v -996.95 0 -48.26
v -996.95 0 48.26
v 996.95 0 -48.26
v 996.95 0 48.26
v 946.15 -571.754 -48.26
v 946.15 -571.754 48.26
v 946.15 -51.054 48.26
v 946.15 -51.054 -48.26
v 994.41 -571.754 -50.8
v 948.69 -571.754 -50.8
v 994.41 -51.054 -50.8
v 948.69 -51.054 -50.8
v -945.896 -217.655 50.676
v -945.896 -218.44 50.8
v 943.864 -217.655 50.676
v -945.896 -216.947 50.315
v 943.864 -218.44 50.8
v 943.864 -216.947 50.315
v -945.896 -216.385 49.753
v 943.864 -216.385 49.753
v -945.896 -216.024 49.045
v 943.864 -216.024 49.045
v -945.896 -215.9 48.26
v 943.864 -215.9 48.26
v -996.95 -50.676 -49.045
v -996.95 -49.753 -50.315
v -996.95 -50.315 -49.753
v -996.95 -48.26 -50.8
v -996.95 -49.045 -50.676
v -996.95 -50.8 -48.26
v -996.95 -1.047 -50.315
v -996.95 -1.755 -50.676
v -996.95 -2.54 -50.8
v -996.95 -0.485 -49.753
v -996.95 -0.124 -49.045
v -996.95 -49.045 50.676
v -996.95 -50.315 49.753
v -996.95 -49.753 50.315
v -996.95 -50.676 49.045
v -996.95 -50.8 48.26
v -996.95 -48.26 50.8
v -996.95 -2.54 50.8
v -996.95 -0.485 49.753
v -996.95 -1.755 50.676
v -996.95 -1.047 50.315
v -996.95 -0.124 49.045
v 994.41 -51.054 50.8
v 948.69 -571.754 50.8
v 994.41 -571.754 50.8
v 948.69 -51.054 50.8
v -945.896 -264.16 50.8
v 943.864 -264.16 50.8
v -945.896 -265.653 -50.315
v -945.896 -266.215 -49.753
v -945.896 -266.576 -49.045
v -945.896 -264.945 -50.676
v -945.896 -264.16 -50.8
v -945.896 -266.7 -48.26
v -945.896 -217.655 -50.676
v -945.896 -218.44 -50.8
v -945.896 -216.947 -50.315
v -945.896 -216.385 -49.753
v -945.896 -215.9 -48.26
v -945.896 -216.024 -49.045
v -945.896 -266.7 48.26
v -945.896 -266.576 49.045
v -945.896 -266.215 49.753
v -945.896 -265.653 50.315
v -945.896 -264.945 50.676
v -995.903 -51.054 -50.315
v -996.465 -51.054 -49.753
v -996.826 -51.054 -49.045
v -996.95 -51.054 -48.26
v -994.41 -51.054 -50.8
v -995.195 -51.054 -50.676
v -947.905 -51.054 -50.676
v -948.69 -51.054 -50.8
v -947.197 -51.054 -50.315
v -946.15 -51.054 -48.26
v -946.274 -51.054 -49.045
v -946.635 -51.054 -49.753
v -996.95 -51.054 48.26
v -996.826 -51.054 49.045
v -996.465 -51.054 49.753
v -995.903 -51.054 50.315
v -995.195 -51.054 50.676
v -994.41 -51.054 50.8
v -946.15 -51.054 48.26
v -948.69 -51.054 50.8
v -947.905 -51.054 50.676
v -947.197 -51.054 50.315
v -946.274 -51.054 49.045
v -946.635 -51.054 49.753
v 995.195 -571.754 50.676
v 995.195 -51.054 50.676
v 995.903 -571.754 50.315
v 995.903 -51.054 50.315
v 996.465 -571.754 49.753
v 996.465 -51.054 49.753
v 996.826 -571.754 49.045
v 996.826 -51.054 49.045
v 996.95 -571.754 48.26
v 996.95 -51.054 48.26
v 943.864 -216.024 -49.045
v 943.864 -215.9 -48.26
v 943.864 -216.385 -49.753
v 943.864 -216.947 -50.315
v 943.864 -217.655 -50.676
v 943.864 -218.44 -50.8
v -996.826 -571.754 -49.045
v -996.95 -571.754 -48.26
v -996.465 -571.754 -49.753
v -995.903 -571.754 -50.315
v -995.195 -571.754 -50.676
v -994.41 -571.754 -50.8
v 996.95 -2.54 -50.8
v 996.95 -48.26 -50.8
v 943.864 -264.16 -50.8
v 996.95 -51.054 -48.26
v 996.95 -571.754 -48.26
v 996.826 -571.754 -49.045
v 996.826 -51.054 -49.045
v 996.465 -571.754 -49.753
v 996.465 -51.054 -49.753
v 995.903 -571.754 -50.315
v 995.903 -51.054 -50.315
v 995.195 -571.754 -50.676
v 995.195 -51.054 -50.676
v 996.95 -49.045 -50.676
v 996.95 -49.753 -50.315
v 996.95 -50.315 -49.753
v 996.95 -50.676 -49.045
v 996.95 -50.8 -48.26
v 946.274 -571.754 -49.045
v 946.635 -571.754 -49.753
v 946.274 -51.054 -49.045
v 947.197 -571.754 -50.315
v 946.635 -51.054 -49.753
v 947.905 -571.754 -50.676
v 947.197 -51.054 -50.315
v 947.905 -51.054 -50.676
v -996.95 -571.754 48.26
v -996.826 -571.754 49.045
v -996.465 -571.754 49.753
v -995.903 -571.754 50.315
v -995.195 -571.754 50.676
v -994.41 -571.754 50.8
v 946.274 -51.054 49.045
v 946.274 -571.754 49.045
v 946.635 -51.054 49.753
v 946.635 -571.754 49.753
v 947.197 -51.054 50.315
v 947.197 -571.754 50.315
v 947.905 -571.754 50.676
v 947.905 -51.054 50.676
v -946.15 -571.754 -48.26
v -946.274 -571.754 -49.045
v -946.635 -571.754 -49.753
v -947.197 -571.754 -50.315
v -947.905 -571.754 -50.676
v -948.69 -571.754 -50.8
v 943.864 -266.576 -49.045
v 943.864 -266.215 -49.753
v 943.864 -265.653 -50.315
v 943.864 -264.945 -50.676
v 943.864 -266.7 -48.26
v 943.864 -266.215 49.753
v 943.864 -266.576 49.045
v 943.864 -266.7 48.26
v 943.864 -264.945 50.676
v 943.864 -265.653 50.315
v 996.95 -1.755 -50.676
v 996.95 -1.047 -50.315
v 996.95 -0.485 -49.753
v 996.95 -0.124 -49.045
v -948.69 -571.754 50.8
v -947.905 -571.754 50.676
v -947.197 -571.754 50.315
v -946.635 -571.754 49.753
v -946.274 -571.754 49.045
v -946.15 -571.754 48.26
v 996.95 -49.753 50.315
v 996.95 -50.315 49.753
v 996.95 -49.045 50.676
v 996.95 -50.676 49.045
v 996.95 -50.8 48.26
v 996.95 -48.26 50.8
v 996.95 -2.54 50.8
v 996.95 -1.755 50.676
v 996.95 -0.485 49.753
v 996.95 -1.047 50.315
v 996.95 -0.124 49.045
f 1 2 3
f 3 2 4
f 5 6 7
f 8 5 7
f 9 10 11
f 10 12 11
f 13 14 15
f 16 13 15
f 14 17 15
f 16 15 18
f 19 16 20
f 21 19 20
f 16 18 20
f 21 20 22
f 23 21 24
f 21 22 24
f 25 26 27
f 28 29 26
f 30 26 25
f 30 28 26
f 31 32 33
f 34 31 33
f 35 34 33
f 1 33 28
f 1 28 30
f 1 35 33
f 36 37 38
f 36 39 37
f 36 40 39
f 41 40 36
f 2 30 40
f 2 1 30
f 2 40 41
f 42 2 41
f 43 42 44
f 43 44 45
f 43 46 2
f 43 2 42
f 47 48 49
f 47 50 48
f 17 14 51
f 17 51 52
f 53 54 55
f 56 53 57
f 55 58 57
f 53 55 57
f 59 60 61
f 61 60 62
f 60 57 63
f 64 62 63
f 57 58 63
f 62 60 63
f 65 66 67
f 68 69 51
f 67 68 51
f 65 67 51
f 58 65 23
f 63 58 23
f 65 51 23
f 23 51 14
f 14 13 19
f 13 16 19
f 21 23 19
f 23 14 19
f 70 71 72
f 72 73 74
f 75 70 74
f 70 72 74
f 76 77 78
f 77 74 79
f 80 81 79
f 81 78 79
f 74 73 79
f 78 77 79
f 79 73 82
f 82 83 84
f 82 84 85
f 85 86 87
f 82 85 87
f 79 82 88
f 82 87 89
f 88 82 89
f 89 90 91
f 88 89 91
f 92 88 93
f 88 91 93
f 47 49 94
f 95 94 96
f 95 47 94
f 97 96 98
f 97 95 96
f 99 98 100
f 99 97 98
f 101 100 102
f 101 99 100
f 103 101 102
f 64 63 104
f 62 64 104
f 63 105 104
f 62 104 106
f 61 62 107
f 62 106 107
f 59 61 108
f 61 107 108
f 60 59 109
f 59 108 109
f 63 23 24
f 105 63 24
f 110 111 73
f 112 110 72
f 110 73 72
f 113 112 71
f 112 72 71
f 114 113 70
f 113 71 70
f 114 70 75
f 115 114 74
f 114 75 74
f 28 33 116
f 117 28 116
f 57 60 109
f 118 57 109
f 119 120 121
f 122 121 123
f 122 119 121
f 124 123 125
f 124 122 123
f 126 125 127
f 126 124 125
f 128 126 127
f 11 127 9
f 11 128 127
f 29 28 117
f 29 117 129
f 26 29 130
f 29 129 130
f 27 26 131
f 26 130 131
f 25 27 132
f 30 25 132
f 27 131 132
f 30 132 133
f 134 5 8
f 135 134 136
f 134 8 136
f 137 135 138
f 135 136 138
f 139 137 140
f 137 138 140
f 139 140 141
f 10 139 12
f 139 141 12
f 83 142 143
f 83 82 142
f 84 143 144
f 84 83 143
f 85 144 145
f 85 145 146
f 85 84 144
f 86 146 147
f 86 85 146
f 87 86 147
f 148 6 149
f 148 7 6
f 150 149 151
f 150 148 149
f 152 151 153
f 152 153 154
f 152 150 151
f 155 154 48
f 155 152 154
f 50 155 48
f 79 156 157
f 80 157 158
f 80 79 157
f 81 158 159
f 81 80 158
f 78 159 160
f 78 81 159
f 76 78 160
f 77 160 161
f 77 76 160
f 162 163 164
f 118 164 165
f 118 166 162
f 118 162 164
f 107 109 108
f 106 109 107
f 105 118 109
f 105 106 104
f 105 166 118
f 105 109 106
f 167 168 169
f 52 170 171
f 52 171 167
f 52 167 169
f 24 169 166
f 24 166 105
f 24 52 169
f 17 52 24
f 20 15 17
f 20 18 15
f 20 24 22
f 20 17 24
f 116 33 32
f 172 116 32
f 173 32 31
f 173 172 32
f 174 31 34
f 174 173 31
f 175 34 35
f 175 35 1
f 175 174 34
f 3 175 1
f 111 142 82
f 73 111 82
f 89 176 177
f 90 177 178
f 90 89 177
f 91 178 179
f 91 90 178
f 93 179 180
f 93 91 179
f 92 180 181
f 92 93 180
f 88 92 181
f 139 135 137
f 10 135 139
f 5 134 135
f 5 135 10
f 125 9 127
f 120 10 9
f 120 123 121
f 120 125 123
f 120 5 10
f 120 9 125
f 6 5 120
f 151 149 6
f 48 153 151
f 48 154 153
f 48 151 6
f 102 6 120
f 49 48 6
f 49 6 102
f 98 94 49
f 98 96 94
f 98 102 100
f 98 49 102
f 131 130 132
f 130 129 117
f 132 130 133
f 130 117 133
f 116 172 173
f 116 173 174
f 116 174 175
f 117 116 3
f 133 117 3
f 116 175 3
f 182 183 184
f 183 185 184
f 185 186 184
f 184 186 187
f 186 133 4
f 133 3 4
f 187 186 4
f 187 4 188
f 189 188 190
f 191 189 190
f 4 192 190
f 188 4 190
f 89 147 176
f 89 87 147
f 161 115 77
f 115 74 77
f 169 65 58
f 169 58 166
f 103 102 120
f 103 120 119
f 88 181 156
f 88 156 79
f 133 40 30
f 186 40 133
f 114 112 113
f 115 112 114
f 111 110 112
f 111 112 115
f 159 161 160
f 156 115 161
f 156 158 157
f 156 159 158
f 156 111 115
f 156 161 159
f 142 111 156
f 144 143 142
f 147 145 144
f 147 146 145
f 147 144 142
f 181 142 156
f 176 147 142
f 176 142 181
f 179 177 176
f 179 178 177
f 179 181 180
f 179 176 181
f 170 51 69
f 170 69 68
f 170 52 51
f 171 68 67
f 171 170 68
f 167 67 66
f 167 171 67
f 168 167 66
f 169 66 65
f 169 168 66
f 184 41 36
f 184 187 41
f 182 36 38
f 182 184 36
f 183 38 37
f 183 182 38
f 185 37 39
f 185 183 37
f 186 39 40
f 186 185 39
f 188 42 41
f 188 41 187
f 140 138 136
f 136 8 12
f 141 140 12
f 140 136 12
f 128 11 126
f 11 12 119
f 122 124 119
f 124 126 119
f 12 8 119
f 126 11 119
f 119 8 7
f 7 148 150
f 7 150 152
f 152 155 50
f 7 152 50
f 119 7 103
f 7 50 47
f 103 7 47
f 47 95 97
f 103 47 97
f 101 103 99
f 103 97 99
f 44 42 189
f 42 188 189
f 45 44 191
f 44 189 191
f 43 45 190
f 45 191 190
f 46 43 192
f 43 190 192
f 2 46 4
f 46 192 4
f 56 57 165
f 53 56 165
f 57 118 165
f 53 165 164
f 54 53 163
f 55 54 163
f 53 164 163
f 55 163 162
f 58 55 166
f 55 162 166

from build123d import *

# Parameters (mm, degrees)
F0_W     = 1993.9
F0_H     = 101.6
F1_DEPTH = 50.8
F2_R     = 2.54
F3_W     = 50.8
F3_H     = 520.7
F4_DEPTH = 50.8
F5_R     = 2.54
F6_W     = 50.8
F6_H     = 520.7
F7_DEPTH = 50.8
F8_W     = 1889.76
F8_H     = 50.8
F9_DEPTH = 50.8
F10_R    = 2.54
F10_2_R  = 2.54


with BuildPart() as f1:
    # F0 (on Front) → F1 (new body)
    with BuildSketch(Plane.XZ):
        Rectangle(F0_W, F0_H)
    extrude(amount=F1_DEPTH)

    # F2
    f2_edges = [f1.edges().sort_by_distance(p)[0] for p in [
        (0, 0, -50.8),
        (0, 0, 50.8),
        (0, -50.8, -50.8),
        (0, -50.8, 50.8),
    ]]
    fillet(f2_edges, radius=F2_R)


with BuildPart() as f4:
    # F3 (on Top) → F4 (new body, symmetric)
    with BuildSketch(Plane.XY):
        with Locations((-971.55, -311.404)):
            Rectangle(F3_W, F3_H)
    extrude(amount=F4_DEPTH, both=True)

    # F5
    f5_edges = [f4.edges().sort_by_distance(p)[0] for p in [
        (-996.95, -311.404, 50.8),
        (-946.15, -311.404, 50.8),
        (-996.95, -311.404, -50.8),
        (-946.15, -311.404, -50.8),
    ]]
    fillet(f5_edges, radius=F5_R)


with BuildPart() as f7:
    # F6 (on Top) → F7 (new body, symmetric)
    with BuildSketch(Plane.XY):
        with Locations((971.55, -311.404)):
            Rectangle(F6_W, F6_H)
    extrude(amount=F7_DEPTH, both=True)

    # F10#2
    f10_2_edges = [f7.edges().sort_by_distance(p)[0] for p in [
        (946.15, -311.404, -50.8),
        (946.15, -311.404, 50.8),
        (996.95, -311.404, 50.8),
        (996.95, -311.404, -50.8),
    ]]
    fillet(f10_2_edges, radius=F10_2_R)


with BuildPart() as f9:
    # F8 (on Top) → F9 (new body, symmetric)
    with BuildSketch(Plane.XY):
        with Locations((-1.016, -241.3)):
            Rectangle(F8_W, F8_H)
    extrude(amount=F9_DEPTH, both=True)

    # F10
    f10_edges = [f9.edges().sort_by_distance(p)[0] for p in [
        (-1.016, -215.9, 50.8),
        (-1.016, -266.7, 50.8),
        (-1.016, -266.7, -50.8),
        (-1.016, -215.9, -50.8),
    ]]
    fillet(f10_edges, radius=F10_R)


solid = Compound([f1.part, f4.part, f7.part, f9.part])
